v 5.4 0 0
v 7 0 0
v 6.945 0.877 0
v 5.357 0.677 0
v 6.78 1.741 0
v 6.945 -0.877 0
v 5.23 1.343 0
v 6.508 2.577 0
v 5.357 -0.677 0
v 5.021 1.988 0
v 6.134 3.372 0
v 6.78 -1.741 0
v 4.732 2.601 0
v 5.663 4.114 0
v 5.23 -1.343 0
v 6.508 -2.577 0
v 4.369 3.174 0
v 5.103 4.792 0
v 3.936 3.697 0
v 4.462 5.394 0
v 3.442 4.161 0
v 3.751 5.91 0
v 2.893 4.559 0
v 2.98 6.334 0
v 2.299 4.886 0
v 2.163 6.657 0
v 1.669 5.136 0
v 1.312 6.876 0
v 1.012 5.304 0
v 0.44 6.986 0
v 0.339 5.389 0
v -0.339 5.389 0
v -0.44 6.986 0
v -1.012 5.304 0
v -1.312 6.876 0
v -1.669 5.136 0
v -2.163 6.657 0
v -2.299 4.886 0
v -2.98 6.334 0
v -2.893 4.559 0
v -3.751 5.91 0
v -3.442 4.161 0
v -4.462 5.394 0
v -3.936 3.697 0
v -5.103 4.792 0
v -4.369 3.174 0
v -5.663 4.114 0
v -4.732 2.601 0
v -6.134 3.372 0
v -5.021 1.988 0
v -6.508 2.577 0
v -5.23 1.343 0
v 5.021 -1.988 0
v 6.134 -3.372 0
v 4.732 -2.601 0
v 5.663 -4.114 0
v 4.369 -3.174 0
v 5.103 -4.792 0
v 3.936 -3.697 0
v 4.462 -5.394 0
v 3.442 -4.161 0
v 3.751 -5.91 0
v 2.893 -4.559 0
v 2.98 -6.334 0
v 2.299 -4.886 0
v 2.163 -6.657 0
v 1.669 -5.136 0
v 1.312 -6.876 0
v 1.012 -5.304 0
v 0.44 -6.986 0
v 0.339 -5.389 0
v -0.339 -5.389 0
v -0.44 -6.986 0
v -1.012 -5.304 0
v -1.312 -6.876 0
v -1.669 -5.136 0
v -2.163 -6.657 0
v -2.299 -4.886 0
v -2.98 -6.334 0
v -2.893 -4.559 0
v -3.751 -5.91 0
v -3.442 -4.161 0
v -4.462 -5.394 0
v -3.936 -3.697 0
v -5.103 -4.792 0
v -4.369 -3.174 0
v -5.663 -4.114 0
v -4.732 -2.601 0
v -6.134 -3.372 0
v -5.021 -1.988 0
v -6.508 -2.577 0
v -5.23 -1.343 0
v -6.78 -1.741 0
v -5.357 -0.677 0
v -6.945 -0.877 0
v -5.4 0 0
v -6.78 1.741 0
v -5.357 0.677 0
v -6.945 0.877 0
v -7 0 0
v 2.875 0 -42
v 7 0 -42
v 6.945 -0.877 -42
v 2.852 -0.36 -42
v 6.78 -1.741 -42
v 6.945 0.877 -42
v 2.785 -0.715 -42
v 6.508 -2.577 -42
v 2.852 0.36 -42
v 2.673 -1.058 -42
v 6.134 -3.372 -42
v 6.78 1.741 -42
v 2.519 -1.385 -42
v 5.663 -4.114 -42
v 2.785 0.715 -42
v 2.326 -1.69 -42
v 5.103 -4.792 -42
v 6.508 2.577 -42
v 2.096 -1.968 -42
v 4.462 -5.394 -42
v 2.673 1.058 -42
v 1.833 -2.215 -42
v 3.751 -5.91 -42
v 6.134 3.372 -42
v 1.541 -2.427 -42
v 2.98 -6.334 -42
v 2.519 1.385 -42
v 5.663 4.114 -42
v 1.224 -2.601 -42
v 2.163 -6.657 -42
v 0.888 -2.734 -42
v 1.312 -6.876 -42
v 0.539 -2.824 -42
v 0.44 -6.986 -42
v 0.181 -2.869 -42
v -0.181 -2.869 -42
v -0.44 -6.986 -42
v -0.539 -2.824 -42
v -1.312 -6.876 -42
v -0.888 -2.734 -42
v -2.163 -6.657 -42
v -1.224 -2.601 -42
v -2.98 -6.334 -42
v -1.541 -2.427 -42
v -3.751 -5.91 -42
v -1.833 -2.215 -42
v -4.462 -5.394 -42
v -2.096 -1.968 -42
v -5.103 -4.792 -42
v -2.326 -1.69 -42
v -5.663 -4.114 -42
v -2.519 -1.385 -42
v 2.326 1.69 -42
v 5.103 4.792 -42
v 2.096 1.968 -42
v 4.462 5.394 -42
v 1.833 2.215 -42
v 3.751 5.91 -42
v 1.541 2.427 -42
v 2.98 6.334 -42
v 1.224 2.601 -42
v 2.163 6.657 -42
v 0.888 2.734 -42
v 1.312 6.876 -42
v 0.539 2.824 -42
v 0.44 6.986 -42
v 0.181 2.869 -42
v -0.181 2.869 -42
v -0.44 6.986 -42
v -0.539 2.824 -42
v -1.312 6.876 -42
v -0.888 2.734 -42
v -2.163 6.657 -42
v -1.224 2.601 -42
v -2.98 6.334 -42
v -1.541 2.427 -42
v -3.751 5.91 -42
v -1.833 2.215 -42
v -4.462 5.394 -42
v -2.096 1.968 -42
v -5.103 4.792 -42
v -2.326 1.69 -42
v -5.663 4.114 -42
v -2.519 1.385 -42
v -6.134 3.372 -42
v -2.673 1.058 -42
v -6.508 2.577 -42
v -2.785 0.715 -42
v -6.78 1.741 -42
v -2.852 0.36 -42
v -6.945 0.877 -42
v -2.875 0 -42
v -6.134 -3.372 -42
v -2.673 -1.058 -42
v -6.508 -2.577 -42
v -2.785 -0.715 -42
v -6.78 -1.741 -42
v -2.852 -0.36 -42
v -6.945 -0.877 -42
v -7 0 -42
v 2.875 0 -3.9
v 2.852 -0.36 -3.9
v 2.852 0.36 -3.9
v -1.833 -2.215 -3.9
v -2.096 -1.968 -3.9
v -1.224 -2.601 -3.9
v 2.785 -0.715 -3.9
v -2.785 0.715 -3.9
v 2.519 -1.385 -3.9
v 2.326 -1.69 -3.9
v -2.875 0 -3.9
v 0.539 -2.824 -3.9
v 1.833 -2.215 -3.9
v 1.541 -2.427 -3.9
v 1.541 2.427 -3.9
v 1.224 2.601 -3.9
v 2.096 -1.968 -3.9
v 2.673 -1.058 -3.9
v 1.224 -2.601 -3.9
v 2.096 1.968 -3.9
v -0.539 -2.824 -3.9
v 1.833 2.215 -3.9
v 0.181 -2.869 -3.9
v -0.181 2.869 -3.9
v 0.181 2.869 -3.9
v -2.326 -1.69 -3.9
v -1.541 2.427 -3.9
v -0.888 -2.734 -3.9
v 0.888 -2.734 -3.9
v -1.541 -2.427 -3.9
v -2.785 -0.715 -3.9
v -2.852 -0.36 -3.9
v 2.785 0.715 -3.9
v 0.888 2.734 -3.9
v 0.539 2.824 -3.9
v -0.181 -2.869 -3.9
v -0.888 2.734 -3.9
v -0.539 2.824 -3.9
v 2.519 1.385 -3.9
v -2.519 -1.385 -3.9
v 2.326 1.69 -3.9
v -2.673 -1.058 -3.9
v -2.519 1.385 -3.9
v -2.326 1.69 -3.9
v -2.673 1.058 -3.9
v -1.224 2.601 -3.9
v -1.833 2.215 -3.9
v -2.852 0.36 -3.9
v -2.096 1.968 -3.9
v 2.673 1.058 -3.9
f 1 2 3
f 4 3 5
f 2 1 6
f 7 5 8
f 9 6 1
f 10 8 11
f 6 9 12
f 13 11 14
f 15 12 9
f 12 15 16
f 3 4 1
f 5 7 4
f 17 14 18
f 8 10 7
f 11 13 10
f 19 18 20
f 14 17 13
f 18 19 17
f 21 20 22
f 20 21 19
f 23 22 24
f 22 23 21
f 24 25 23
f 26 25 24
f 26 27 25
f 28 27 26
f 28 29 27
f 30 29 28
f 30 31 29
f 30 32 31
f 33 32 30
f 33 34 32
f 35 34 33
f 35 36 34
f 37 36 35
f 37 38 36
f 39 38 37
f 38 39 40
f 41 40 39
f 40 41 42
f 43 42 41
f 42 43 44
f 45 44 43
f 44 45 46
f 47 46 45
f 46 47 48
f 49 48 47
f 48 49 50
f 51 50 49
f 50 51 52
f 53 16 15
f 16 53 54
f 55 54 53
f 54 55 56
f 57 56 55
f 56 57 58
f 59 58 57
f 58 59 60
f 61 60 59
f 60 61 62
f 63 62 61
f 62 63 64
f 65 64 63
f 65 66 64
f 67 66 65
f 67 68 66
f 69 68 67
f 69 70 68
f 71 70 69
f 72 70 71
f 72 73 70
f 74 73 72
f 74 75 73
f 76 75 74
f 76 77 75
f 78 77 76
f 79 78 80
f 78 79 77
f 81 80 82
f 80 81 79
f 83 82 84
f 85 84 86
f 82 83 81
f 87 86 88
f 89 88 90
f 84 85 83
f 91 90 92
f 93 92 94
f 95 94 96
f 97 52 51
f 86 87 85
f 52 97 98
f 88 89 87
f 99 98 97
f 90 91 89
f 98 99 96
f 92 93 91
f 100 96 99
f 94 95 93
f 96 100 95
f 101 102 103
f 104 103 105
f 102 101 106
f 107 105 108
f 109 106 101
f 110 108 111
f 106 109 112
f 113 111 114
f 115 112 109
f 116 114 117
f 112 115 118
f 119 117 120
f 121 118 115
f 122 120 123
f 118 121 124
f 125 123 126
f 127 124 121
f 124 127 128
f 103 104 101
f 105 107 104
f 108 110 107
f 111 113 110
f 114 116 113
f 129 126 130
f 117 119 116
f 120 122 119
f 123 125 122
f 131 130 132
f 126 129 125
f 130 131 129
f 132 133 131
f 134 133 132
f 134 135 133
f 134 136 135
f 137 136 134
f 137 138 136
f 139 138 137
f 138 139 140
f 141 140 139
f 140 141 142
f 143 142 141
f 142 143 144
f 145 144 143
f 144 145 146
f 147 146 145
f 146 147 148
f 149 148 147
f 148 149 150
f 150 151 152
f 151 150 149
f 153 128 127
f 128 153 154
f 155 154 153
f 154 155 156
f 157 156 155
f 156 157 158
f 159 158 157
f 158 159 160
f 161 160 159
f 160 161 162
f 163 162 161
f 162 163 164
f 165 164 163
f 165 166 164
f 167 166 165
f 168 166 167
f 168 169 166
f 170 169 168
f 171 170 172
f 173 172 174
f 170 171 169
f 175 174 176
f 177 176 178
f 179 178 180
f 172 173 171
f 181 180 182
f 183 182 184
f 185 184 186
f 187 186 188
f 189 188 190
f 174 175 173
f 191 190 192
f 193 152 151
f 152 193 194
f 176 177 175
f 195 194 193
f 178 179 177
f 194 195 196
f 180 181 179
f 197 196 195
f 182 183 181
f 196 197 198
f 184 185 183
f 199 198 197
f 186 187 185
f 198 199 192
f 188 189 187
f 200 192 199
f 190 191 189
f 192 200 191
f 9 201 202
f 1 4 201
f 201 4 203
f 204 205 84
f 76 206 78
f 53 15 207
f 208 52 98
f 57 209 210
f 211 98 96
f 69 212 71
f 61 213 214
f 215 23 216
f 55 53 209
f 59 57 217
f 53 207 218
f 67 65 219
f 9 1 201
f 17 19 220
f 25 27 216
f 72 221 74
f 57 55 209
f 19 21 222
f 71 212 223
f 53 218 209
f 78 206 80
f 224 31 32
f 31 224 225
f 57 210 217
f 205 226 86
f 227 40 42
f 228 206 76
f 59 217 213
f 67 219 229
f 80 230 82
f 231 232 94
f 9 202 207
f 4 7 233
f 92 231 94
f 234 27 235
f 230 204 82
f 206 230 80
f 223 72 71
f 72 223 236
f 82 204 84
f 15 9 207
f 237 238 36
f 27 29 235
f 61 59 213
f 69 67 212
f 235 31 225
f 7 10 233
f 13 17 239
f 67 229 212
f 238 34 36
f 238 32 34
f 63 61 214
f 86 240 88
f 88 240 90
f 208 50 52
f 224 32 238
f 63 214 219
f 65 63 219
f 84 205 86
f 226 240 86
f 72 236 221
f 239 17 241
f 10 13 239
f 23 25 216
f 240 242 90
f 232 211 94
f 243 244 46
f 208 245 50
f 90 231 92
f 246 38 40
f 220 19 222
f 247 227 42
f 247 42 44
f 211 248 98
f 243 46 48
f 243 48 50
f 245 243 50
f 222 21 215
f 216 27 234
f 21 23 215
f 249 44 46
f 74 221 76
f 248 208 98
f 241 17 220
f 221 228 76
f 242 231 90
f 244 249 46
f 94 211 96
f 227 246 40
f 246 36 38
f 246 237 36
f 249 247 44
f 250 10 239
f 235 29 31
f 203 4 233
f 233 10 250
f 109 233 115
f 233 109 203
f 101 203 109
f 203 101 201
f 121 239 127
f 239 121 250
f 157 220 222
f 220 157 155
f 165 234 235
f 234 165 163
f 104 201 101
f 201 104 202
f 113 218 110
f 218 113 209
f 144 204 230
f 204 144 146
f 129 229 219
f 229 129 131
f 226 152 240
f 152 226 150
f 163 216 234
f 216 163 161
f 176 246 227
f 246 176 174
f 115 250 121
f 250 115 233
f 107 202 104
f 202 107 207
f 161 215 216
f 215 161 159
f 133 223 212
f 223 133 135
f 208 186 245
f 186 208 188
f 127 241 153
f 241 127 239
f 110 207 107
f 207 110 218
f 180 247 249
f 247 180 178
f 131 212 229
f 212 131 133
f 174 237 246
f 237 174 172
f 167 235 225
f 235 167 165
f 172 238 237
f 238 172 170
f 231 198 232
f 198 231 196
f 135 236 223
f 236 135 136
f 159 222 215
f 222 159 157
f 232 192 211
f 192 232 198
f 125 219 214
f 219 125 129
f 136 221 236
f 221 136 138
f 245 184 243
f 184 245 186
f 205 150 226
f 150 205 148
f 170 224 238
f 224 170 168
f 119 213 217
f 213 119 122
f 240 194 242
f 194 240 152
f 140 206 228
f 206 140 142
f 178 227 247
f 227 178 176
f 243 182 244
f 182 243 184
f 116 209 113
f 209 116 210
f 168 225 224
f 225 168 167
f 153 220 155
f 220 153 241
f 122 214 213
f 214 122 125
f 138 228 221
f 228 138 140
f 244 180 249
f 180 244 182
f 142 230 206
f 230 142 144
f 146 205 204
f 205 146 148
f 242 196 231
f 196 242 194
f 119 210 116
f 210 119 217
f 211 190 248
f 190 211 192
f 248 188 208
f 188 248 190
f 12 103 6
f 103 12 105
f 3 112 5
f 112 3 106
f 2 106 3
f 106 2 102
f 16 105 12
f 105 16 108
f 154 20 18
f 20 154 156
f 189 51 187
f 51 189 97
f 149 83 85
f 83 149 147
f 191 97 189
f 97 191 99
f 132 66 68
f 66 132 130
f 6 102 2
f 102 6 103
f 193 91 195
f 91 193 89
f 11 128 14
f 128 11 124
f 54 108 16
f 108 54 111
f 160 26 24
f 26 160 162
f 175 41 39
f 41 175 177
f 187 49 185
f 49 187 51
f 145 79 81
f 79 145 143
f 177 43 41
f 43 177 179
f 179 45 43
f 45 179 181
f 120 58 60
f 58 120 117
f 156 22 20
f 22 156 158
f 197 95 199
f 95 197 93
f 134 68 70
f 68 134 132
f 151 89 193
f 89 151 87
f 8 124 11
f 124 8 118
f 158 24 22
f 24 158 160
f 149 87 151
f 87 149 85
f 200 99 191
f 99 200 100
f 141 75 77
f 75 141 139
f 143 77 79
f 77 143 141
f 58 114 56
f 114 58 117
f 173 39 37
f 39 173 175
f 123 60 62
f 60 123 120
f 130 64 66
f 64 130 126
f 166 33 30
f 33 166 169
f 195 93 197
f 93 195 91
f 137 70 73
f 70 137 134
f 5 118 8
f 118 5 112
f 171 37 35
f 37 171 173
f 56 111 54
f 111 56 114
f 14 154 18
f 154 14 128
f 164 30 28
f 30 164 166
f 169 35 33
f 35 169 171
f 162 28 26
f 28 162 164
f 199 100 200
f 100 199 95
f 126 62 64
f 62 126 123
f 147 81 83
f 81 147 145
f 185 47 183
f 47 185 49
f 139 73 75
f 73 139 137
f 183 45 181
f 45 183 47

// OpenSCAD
$fn = 50;


difference() {
	union() {
		translate(v = [0, 0, -42.0000000000]) {
			cylinder(h = 42, r = 7.0000000000);
		}
		cylinder(h = 0, r = 17.0000000000);
	}
	union() {
		translate(v = [0, 0, 0]) {
			rotate(a = [0, 0, 0]) {
				difference() {
					union() {
						#translate(v = [0, 0, -42.0000000000]) {
							cylinder(h = 42, r = 2.6000000000);
						}
						#translate(v = [0, 0, -3.9000000000]) {
							cylinder(h = 3.9000000000, r1 = 2.8750000000, r2 = 5.4000000000);
						}
						#translate(v = [0, 0, -42.0000000000]) {
							cylinder(h = 42, r = 2.8750000000);
						}
						#translate(v = [0, 0, -42.0000000000]) {
							cylinder(h = 42, r = 2.6000000000);
						}
					}
					union();
				}
			}
		}
	}
}
